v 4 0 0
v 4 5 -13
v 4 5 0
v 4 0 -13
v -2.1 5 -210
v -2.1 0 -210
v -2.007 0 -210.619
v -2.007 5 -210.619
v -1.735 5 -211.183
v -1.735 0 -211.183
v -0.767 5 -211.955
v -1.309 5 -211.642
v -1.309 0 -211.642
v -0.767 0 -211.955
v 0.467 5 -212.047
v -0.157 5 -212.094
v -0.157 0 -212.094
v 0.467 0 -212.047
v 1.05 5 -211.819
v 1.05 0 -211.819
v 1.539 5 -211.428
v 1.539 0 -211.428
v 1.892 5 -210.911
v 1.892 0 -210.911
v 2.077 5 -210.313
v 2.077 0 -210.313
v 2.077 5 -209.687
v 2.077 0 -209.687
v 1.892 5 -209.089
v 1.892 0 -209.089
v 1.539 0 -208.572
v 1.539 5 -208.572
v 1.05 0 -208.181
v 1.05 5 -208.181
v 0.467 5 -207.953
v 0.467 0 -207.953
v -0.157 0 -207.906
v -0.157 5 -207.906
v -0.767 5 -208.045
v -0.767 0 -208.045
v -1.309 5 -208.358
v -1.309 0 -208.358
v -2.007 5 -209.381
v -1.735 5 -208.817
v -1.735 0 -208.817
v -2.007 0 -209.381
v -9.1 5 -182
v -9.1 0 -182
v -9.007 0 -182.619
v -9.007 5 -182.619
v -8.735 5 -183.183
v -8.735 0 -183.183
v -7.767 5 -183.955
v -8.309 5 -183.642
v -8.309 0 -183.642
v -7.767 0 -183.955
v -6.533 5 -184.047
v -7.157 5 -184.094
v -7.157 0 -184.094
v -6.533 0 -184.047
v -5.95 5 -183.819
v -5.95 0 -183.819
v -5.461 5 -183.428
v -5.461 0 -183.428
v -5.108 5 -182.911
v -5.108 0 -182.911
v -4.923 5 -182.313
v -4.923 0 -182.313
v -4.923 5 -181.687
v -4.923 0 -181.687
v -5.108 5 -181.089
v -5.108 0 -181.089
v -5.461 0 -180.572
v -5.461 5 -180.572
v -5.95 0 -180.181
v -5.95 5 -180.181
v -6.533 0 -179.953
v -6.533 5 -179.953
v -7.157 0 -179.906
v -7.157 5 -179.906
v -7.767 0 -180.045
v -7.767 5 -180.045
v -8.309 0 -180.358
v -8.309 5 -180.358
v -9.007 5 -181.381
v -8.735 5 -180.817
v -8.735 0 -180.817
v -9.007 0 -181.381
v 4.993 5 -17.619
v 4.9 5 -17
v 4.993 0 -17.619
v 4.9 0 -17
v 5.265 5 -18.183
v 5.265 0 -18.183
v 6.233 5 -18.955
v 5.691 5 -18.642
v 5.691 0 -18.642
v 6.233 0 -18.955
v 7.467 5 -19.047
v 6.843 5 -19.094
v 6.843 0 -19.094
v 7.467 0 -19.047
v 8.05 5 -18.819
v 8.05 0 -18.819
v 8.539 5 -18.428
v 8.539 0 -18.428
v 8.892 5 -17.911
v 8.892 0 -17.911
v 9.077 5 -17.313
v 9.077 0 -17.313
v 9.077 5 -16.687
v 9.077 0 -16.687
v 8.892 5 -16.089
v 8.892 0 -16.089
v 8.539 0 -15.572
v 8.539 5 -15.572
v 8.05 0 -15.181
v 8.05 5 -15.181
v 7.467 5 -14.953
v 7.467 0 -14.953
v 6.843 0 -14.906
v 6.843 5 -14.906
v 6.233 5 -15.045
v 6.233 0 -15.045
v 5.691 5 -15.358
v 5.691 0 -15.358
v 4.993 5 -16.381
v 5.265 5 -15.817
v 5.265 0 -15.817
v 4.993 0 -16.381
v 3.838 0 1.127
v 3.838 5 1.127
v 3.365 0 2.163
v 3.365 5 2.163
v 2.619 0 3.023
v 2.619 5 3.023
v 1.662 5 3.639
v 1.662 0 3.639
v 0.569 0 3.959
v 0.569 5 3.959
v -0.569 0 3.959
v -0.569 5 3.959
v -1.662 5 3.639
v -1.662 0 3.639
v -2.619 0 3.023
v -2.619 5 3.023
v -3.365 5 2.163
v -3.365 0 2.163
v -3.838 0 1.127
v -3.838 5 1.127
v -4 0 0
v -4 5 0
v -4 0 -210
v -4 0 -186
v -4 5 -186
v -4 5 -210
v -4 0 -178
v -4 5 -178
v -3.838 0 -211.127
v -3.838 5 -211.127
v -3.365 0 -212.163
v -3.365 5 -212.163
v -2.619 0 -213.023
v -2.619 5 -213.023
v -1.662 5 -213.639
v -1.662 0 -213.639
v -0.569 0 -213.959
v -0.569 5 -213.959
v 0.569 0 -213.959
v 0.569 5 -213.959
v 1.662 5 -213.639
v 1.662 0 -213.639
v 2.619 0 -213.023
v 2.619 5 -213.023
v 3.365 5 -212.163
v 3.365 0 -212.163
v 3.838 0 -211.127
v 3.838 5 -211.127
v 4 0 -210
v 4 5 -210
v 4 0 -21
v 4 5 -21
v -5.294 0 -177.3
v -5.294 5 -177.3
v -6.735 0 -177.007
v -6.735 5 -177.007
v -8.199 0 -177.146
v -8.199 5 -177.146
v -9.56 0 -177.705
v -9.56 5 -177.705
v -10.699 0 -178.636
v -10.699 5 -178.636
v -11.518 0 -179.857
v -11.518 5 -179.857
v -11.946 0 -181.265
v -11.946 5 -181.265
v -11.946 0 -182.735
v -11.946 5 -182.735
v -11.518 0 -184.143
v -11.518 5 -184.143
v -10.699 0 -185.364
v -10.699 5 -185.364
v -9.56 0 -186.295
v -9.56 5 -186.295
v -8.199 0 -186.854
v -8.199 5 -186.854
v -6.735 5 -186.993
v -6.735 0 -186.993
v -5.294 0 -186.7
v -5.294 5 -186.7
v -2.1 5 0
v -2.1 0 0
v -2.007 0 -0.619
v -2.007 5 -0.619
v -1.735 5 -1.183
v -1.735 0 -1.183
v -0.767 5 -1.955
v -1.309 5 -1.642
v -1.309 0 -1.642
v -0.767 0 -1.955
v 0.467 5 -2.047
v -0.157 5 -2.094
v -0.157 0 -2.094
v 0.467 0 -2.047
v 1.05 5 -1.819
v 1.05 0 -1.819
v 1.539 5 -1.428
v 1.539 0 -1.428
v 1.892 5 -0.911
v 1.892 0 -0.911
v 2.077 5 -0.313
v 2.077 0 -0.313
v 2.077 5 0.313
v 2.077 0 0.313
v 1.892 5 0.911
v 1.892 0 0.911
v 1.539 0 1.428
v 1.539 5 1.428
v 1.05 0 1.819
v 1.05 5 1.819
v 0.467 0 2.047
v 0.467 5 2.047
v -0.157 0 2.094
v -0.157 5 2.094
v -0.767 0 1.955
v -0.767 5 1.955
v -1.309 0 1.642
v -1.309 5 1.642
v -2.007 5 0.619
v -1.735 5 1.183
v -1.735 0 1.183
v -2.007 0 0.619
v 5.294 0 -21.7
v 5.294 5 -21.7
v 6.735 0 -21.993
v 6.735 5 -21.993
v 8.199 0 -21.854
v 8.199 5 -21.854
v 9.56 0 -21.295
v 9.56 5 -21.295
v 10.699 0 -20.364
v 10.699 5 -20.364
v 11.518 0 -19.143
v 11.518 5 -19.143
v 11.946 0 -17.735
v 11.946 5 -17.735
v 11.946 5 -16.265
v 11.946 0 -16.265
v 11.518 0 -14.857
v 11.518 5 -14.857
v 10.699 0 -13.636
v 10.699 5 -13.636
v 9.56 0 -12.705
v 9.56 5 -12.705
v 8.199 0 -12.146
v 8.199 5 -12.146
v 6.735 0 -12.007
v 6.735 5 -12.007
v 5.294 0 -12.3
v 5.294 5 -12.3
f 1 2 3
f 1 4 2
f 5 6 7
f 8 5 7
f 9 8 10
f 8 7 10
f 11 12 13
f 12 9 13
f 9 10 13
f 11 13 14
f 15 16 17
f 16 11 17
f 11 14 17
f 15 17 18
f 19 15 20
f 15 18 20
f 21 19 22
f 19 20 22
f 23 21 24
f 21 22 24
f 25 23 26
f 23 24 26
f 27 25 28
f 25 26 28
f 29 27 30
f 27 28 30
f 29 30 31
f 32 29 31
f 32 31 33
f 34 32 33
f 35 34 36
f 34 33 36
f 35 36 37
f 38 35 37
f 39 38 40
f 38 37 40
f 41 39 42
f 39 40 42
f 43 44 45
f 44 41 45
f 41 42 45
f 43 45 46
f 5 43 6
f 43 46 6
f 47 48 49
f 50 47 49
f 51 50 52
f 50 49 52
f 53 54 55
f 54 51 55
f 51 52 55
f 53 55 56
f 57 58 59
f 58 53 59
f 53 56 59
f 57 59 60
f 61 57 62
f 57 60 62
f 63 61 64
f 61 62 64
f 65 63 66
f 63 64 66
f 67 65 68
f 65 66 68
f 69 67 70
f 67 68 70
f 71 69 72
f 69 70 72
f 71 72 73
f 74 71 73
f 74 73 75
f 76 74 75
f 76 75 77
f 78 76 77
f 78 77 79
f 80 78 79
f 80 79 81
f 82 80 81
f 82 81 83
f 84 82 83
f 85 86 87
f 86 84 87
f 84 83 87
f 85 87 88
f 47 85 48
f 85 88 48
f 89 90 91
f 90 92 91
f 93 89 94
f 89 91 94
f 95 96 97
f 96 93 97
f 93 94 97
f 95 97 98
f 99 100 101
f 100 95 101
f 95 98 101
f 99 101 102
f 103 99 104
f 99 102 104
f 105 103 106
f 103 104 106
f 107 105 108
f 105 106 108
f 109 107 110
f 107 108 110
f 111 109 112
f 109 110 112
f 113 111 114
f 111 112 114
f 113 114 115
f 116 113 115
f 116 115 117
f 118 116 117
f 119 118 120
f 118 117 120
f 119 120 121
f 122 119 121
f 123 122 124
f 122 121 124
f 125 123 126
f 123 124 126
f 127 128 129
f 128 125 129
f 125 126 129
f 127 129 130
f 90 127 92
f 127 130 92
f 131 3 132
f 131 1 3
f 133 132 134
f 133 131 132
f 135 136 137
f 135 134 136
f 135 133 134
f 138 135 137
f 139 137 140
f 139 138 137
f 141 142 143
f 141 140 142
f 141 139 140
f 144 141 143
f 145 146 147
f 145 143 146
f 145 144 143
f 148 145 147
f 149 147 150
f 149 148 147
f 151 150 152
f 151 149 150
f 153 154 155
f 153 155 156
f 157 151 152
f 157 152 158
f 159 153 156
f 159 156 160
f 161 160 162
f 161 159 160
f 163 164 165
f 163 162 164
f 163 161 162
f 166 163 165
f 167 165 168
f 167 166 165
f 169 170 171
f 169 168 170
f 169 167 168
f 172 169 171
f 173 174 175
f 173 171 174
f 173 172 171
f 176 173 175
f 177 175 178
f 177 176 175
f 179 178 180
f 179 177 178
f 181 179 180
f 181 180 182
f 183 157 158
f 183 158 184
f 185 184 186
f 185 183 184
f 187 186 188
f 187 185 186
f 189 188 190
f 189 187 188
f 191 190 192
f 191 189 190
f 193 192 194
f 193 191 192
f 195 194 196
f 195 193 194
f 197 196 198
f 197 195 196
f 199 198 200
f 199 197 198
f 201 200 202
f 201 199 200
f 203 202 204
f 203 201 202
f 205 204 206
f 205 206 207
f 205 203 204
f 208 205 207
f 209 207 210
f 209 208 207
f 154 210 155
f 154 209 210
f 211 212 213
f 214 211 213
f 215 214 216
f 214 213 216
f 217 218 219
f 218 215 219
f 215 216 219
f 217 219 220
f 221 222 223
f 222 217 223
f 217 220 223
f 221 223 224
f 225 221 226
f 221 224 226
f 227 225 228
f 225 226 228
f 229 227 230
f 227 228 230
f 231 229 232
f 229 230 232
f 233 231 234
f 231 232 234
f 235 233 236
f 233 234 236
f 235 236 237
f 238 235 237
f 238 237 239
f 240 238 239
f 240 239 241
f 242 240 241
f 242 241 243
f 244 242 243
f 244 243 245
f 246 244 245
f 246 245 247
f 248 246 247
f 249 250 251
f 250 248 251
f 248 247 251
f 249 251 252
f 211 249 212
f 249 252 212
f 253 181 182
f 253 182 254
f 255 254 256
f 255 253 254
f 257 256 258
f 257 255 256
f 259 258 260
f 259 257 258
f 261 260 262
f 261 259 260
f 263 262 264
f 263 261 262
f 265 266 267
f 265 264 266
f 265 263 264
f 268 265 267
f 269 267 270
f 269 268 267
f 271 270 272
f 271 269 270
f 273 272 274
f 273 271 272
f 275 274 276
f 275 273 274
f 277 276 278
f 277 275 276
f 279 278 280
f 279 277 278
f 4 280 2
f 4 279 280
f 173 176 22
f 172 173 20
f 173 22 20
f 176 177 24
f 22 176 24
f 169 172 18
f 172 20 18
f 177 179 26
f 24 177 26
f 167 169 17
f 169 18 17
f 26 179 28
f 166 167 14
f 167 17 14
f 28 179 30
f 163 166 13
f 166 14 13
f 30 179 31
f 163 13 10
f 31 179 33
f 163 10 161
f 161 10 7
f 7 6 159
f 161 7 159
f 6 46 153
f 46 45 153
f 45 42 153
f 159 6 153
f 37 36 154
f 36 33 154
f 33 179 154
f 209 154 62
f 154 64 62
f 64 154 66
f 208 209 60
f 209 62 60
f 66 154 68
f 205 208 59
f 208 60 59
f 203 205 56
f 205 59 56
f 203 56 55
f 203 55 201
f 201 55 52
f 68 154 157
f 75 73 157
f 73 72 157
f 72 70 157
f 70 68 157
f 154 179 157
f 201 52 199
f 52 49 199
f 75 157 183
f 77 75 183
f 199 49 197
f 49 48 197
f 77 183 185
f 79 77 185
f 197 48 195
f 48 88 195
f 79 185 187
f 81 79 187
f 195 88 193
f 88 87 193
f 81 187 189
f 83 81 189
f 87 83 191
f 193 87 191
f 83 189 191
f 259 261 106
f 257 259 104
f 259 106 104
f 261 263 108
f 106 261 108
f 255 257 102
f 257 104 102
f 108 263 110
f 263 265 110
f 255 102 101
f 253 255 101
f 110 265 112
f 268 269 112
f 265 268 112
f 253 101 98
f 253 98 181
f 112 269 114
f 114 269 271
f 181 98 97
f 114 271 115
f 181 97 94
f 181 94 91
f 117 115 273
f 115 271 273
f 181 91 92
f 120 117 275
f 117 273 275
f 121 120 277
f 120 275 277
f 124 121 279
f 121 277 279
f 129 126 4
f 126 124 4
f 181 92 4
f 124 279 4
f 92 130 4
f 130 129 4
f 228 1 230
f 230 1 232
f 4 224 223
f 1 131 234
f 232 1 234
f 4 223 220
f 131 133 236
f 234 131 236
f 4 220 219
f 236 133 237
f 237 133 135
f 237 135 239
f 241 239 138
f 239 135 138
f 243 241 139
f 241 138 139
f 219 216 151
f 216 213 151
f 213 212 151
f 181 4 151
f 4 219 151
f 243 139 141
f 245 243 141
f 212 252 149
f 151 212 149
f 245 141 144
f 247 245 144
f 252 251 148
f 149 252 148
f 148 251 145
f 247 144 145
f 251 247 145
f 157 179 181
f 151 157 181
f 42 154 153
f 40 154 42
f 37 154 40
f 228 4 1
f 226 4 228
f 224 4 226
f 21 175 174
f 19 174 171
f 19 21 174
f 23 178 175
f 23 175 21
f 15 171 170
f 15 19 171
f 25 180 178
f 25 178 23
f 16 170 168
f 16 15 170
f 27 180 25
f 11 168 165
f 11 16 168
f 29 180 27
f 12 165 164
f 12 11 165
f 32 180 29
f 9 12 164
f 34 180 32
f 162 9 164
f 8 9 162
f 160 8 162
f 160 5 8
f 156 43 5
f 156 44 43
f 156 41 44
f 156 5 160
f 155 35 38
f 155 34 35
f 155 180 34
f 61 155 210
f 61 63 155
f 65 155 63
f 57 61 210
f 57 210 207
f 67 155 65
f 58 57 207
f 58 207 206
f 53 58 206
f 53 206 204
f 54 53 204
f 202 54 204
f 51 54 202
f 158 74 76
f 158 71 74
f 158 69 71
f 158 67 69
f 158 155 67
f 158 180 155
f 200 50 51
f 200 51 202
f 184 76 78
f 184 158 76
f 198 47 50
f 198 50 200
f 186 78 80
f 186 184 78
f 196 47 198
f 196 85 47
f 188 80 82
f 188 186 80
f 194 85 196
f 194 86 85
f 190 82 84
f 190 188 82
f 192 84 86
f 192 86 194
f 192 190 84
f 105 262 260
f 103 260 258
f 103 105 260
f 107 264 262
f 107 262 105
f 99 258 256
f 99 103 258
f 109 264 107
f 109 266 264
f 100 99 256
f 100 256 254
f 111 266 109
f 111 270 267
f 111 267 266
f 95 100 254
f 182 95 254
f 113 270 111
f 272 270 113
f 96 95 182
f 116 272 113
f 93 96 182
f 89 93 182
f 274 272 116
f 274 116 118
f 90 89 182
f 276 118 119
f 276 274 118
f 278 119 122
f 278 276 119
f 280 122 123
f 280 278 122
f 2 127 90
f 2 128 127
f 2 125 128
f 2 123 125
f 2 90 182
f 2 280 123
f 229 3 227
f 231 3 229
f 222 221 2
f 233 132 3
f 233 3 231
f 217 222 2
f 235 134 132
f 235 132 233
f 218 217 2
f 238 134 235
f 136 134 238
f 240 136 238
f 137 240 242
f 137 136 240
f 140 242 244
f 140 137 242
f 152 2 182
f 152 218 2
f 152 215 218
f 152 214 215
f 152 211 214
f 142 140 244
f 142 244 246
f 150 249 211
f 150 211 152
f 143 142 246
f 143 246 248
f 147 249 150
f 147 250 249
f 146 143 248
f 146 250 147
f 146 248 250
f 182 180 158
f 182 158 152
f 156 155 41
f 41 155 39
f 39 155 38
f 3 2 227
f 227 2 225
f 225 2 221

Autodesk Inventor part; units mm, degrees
ref_plane "YZ Plane" through (0, 0, 0) normal (1, 0, 0) x (0, 1, 0)
ref_plane "XZ Plane" through (0, 0, 0) normal (0, 1, 0) x (-1, 0, 0)
ref_plane "XY Plane" through (0, 0, 0) normal (0, 0, 1) x (1, 0, 0)
sketch "Sketch1" plane through (0, 0, 0) normal (0, 1, 0) x (-1, 0, 0)
  line L0 (0, 0) -> (0, -210) construction
  line L1 (4, 0) -> (4, -210)
  line L2 (-4, -210) -> (-4, 0)
  arc A0 (4, 0) -> (-4, 0) centre (0, 0) ccw
  arc A1 (-4, -210) -> (4, -210) centre (0, -210) ccw
  circle A2 centre (0, 0) radius 2.1
  circle A3 centre (0, -210) radius 2.1
  circle A4 centre (-7, -17) radius 2.1
  circle A5 centre (7, -182) radius 2.1
  circle A6 centre (-7, -17) radius 5
  circle A7 centre (7, -182) radius 5
  point P0 (0, -105)
  point P1 (-4, -13)
  point P2 (-4, -21)
  point P3 (4, -178)
  point P4 (4, -186)
  dimension "d0" = 210
  dimension "d1" = 8
  dimension "d2" = 4.2
  dimension "d3" = 4.2
  dimension "d6" = 4.2
  dimension "d7" = 4.2
  dimension "d8" = 3
  dimension "d9" = 3
  dimension "d10" = 10
  dimension "d11" = 10
  dimension "d12" = 17
  dimension "d13" = 182
extrude "Extrusion1" add sketch "Sketch1" along normal blind 5
